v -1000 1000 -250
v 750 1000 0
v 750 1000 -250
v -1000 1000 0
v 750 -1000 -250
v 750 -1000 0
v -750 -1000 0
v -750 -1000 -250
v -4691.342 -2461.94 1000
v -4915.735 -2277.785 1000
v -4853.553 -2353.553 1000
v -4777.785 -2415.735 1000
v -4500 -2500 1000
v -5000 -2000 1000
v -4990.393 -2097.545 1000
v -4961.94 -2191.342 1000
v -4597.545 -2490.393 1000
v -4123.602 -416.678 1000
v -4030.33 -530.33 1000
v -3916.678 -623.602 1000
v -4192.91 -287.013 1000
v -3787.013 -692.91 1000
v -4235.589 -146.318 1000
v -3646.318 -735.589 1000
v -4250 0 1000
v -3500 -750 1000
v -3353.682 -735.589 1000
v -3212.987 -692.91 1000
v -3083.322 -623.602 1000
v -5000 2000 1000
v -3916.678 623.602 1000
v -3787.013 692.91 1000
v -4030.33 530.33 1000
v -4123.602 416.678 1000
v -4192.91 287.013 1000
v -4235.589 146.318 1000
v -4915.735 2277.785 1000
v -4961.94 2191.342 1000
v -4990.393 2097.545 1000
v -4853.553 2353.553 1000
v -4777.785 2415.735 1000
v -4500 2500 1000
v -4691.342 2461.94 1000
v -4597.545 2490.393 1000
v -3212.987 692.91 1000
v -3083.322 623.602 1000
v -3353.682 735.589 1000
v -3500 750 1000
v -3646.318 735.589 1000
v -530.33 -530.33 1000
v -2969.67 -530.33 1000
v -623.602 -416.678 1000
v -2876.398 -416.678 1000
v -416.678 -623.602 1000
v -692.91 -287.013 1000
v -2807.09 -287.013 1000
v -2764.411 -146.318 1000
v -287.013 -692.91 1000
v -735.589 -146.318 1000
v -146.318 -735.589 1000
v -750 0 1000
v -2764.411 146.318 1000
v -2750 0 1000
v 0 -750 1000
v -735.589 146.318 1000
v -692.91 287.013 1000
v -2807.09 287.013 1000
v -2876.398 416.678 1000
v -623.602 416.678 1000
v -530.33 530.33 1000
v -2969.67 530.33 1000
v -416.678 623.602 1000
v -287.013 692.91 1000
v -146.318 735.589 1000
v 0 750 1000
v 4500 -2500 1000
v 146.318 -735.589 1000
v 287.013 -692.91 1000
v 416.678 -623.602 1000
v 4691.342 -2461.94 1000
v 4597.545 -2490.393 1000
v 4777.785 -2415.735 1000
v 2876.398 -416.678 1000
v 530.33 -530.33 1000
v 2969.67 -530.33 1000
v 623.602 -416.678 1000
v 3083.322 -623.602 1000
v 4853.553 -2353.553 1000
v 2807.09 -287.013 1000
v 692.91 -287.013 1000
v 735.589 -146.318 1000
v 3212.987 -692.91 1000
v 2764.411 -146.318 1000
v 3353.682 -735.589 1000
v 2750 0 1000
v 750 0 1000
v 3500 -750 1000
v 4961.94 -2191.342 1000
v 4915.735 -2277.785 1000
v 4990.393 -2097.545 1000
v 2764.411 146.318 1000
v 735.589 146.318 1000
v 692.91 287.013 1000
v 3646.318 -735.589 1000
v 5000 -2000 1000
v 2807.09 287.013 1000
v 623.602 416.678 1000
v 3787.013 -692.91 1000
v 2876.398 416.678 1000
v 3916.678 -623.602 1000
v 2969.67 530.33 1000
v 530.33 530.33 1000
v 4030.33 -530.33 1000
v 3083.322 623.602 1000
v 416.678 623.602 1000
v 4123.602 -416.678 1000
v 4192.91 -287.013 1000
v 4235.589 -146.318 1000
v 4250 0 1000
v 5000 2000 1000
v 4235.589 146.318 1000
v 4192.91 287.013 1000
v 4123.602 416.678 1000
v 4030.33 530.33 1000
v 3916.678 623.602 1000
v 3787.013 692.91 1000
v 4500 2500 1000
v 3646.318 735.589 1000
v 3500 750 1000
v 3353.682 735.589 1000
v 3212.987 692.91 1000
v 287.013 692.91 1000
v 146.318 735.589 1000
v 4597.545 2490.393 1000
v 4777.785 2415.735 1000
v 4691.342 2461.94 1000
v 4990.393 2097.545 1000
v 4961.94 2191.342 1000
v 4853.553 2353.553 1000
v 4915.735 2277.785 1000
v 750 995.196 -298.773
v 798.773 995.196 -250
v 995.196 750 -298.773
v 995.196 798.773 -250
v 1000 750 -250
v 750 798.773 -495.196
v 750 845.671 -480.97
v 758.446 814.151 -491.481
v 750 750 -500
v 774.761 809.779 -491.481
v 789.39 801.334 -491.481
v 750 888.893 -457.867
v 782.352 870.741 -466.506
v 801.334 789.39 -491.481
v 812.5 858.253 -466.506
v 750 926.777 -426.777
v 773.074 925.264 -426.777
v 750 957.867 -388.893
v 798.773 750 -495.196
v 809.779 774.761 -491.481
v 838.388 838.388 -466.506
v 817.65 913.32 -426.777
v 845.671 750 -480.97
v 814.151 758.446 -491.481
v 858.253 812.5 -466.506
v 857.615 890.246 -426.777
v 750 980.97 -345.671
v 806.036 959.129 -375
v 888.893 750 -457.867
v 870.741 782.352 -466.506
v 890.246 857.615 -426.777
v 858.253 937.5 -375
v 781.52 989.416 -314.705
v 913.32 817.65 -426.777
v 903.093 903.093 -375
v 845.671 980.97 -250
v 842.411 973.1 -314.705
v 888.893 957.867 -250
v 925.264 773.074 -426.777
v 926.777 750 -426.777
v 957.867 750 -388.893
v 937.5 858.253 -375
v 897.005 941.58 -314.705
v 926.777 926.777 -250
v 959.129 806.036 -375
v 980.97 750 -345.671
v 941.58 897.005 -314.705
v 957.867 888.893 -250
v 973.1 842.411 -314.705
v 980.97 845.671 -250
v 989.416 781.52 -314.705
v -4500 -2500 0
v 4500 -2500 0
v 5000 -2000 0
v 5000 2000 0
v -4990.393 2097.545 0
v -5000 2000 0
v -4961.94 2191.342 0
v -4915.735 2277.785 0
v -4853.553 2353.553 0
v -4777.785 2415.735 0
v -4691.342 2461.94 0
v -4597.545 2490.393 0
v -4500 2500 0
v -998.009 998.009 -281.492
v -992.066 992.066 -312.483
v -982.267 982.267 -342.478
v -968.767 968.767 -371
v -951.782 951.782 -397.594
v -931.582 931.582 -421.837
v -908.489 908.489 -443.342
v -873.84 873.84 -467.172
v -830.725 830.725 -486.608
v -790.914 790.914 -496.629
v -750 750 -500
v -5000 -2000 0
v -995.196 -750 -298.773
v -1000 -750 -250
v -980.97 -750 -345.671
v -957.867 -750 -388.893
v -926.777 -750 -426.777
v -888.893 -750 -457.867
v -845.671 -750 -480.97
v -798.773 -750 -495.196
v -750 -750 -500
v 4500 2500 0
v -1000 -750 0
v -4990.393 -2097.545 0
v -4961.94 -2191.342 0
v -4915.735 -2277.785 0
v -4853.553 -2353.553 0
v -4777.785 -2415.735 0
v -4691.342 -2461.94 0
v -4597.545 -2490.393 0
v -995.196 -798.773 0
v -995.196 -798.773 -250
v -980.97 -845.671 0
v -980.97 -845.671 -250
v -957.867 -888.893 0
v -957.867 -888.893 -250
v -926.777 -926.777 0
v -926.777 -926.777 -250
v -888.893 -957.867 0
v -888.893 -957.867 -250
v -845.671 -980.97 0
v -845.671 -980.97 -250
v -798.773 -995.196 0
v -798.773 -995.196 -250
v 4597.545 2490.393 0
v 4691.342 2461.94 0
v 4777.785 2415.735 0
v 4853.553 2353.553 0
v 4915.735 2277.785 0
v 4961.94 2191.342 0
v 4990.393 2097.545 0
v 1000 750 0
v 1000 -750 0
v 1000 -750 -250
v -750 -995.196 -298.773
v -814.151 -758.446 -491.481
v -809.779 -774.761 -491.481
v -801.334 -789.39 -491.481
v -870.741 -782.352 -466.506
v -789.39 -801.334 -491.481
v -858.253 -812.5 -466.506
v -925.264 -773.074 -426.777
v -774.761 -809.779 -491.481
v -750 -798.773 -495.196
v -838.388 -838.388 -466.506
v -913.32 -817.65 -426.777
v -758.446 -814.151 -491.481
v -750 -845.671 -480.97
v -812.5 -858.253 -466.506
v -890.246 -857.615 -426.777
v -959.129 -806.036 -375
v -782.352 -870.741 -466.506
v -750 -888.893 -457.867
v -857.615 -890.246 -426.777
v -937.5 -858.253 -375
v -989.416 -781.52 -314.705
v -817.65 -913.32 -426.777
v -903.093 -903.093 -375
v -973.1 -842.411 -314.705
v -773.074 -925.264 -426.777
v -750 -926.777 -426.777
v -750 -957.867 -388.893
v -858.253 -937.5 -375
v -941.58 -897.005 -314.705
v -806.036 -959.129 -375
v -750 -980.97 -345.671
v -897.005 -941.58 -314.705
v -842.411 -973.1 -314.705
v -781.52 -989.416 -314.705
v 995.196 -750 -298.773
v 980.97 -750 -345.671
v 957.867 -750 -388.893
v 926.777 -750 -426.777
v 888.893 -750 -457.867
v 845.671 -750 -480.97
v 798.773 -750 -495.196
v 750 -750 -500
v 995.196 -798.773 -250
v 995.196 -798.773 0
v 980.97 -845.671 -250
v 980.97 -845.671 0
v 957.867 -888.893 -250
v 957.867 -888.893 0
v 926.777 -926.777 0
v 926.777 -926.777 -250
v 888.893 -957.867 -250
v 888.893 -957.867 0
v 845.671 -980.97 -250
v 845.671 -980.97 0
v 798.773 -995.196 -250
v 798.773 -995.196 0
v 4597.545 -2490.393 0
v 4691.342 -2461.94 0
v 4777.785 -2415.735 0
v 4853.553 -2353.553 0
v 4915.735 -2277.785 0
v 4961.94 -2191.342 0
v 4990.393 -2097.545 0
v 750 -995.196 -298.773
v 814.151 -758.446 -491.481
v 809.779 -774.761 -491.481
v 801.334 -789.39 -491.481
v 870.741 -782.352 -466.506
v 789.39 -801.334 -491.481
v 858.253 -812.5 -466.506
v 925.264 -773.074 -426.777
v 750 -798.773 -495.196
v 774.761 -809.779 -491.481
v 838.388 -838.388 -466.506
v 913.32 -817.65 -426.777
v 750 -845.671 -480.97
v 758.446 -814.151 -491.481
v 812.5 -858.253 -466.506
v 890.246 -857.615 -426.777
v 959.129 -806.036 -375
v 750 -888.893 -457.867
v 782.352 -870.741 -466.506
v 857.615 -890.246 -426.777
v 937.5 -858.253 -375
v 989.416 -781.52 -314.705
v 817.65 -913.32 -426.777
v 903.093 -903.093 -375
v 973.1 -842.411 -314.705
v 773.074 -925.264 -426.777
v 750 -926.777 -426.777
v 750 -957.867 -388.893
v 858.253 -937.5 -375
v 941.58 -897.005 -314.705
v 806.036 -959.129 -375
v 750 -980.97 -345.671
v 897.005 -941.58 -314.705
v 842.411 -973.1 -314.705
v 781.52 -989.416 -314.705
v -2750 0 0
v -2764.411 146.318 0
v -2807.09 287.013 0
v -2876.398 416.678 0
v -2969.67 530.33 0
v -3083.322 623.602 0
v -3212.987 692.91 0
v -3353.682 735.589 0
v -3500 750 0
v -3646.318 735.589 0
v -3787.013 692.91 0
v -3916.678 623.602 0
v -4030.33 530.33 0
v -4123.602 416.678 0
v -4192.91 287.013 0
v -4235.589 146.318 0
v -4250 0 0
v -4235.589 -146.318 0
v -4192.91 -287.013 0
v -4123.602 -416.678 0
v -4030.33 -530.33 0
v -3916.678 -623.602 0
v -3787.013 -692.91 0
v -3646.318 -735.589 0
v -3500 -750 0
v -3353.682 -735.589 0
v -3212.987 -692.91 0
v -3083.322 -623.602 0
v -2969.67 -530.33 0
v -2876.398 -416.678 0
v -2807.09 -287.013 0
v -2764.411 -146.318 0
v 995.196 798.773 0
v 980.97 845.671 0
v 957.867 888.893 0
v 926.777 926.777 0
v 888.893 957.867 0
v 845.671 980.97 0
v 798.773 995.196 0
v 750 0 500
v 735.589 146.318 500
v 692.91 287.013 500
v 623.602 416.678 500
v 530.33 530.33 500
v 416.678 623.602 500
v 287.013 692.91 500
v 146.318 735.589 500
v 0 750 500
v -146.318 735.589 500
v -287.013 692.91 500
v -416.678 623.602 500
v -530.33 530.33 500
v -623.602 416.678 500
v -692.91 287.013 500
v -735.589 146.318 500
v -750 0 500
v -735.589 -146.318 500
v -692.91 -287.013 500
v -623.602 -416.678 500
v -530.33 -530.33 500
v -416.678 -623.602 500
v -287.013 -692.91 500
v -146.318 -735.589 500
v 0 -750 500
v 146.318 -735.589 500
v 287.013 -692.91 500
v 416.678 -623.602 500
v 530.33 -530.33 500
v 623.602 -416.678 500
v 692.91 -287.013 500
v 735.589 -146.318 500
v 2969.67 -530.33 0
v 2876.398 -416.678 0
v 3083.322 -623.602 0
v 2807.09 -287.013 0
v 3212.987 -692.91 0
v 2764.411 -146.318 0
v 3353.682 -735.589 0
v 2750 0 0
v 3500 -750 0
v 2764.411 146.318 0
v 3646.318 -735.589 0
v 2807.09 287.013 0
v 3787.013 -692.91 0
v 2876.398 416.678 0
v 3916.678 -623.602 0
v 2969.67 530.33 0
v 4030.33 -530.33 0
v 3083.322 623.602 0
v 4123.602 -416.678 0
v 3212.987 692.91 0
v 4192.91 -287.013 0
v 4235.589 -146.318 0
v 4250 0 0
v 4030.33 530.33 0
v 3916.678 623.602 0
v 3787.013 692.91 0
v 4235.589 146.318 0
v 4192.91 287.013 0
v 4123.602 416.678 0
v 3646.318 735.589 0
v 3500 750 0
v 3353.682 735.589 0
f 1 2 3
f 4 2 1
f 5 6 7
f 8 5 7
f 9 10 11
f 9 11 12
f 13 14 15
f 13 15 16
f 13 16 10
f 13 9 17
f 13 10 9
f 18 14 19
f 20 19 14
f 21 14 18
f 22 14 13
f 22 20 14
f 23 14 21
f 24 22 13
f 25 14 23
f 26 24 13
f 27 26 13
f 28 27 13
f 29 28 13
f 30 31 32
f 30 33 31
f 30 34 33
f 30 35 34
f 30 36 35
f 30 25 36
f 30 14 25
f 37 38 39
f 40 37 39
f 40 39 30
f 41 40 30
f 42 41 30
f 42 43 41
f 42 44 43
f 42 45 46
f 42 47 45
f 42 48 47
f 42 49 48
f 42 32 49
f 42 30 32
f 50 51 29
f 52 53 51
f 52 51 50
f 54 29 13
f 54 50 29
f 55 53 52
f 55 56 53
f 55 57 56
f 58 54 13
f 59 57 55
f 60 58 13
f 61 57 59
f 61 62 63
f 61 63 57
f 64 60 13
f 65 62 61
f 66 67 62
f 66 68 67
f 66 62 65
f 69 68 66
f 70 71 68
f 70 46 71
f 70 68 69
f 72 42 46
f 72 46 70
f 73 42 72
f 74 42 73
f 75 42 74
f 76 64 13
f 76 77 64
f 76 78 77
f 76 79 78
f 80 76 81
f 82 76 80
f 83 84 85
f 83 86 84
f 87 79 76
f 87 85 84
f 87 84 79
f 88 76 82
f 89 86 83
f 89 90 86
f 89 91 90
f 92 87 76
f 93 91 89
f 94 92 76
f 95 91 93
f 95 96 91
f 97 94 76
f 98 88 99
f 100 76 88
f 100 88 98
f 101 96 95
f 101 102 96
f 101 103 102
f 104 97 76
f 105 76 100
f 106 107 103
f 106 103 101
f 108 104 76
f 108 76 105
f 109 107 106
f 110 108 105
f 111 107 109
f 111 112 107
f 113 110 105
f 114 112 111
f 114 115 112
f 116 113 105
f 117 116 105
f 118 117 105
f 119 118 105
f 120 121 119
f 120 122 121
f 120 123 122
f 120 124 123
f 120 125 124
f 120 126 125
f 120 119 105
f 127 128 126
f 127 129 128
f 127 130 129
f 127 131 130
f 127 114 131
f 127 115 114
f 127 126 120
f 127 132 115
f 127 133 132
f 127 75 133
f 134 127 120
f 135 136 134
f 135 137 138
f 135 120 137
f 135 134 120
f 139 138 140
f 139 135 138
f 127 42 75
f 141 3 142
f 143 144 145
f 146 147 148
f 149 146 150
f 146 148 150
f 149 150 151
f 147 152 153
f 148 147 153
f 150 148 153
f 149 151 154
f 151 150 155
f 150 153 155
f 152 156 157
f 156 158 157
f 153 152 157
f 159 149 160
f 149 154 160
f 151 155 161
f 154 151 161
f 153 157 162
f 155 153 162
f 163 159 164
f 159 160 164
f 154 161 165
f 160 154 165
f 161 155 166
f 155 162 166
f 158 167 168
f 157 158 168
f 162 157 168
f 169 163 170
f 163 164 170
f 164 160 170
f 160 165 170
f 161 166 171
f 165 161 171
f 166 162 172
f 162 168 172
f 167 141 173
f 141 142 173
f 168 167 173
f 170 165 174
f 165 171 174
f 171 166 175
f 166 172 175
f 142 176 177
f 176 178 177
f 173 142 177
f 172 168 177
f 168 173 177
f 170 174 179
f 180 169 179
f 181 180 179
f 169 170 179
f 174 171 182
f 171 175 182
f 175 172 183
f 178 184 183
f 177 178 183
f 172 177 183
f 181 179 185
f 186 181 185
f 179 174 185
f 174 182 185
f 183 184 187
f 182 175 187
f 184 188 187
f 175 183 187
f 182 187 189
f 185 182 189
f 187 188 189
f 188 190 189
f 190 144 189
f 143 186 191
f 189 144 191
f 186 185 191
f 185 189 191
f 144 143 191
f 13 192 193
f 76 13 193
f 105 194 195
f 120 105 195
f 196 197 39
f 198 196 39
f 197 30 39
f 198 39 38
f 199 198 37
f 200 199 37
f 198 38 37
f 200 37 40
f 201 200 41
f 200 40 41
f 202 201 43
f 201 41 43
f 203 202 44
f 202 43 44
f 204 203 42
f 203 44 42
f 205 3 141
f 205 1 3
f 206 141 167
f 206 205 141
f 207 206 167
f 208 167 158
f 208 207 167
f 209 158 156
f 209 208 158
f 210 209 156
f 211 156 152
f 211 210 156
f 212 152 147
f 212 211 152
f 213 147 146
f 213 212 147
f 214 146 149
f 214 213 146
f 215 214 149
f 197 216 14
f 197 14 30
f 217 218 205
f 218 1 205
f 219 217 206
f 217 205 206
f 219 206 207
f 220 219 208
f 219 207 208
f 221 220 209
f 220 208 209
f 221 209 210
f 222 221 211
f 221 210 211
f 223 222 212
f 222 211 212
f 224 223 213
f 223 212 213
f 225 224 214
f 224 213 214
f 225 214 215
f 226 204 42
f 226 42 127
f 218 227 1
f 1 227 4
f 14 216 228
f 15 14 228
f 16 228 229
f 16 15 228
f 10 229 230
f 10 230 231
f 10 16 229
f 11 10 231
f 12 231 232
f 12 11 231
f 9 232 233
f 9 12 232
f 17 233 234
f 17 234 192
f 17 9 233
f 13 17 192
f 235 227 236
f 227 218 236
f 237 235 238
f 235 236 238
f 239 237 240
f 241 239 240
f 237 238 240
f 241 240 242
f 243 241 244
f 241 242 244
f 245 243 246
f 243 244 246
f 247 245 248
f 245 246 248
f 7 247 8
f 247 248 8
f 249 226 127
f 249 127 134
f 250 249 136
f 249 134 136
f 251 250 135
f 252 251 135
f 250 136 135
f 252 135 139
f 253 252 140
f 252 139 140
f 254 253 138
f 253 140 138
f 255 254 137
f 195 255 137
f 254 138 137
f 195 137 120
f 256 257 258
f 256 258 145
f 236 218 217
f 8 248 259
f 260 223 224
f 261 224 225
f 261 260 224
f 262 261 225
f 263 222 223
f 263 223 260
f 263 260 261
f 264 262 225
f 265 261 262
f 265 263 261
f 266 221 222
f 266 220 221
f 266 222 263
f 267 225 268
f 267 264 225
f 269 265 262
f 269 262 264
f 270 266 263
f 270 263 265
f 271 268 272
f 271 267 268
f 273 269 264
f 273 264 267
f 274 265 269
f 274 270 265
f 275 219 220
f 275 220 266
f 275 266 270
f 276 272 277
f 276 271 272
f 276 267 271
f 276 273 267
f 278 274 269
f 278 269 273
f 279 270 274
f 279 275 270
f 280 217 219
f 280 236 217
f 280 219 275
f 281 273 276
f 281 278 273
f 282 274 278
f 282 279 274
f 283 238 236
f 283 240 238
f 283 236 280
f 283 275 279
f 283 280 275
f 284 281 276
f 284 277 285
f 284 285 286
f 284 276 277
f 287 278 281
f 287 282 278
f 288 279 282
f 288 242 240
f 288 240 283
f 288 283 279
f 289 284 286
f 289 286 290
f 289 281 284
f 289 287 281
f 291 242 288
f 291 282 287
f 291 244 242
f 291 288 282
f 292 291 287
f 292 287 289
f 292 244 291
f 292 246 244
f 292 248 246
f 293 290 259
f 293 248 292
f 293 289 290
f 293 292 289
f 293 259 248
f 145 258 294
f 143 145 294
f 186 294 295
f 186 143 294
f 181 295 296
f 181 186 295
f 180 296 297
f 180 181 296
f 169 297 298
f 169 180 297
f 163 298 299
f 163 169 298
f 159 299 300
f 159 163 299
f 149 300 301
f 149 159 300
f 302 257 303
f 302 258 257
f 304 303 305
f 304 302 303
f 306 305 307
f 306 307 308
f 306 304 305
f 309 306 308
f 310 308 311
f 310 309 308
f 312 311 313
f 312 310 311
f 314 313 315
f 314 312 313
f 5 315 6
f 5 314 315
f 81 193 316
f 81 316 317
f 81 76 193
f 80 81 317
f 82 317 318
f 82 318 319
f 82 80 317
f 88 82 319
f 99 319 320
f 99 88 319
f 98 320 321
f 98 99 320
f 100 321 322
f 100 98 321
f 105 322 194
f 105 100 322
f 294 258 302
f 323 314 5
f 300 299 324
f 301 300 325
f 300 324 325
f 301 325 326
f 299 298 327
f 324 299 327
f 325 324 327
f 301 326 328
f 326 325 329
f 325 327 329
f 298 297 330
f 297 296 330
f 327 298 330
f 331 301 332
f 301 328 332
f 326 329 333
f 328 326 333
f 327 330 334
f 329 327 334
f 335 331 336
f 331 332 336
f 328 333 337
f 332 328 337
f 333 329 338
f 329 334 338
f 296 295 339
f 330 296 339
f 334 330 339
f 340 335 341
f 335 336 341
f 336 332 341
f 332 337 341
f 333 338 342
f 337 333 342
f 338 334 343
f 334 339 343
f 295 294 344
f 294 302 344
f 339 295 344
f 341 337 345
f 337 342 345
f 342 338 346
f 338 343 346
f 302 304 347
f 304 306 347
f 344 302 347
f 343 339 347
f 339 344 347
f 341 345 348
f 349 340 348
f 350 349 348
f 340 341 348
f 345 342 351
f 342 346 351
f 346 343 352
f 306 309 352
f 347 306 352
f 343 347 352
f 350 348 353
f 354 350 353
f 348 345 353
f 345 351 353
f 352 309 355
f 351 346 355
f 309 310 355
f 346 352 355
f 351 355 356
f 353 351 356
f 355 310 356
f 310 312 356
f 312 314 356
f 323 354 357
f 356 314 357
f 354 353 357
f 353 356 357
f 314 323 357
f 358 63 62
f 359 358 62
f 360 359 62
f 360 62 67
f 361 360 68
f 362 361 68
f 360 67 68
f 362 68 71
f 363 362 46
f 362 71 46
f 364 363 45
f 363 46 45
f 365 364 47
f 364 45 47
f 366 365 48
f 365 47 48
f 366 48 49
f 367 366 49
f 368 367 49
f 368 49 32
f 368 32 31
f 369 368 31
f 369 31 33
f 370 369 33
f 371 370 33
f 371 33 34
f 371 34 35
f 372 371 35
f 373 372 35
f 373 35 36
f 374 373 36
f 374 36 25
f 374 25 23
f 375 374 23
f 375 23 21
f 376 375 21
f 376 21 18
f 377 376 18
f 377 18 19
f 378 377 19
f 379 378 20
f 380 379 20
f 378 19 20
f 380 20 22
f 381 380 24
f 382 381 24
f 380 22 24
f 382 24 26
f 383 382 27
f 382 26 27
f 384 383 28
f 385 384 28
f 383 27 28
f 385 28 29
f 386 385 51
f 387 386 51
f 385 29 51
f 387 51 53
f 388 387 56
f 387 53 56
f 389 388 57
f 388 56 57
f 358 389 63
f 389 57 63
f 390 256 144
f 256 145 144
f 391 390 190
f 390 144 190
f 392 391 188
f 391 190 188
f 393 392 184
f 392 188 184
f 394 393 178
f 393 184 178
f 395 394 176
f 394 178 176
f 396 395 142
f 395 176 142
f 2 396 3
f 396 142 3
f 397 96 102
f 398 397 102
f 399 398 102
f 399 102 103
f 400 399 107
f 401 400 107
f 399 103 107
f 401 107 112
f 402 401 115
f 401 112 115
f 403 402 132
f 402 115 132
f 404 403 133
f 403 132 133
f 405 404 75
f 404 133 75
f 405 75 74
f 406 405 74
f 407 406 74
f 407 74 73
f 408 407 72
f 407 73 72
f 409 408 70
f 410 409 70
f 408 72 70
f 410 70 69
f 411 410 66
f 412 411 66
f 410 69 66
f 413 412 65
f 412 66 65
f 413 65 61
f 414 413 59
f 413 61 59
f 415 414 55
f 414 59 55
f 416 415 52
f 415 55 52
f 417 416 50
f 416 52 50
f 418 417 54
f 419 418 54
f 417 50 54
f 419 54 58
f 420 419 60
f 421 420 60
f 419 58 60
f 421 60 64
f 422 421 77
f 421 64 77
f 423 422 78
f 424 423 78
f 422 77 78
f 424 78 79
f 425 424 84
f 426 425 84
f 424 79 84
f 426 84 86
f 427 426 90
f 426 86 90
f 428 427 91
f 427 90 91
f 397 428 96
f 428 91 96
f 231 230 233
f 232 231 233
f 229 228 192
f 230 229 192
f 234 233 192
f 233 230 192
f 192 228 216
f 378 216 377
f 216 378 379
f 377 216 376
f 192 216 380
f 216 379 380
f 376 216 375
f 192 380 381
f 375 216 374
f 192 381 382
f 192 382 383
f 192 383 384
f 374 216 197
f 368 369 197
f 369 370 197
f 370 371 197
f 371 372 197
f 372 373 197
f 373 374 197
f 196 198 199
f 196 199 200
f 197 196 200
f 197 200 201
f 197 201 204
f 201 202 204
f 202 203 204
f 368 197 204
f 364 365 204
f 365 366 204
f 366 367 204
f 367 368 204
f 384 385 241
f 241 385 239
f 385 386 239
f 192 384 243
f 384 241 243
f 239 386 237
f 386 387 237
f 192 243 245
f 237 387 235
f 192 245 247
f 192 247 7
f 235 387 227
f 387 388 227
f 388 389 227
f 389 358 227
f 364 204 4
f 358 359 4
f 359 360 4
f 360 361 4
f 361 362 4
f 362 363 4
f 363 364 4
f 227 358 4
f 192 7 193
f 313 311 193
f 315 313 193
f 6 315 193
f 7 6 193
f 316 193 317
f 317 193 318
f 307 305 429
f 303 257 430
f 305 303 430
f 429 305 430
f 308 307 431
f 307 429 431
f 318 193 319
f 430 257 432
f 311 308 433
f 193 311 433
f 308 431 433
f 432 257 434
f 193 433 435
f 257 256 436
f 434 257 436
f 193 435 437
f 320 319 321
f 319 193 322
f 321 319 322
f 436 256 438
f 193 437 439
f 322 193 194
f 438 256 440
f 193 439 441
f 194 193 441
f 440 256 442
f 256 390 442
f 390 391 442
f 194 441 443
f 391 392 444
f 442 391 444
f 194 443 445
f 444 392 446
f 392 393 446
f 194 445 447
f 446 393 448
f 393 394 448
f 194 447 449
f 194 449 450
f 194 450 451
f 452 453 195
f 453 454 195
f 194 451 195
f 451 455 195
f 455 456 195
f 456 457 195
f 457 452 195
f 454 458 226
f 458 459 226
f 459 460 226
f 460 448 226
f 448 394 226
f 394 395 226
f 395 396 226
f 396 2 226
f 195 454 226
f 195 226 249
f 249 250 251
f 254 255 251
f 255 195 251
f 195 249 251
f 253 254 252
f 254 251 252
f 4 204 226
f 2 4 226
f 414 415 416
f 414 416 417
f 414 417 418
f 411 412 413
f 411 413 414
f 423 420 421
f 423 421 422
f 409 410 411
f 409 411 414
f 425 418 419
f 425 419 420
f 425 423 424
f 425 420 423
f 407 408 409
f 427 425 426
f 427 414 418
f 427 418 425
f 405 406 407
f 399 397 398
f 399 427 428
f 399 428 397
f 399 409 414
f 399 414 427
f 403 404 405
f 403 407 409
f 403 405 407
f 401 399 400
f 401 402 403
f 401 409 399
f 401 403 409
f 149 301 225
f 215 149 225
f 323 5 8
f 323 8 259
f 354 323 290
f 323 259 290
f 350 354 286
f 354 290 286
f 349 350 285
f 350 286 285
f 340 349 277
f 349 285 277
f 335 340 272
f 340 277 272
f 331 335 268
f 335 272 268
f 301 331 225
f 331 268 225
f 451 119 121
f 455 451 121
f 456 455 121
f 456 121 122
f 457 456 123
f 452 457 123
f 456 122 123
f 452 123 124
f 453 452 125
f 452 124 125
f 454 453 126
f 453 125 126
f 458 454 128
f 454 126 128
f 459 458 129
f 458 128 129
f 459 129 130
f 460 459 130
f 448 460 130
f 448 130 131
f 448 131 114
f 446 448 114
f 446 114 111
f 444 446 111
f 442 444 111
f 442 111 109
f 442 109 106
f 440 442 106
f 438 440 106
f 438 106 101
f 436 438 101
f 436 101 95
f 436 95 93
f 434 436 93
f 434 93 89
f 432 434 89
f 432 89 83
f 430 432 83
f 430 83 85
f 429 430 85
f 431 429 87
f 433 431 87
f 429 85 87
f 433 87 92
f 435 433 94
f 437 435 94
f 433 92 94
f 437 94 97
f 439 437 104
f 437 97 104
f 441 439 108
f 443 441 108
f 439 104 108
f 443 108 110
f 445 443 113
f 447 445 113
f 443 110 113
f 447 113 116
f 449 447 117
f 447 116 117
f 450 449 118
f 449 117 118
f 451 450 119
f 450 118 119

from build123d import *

# Parameters (mm, degrees)
SKETCH1_W           = 10000
SKETCH1_H           = 5000
BOSS_EXTRUDE1_DEPTH = 1000
FILLET1_R           = 500
FILLET2_R           = 500
SKETCH2_R           = 750
CUT_EXTRUDE1_DEPTH  = 5679.9083458
SKETCH3_R           = 750
CUT_EXTRUDE2_DEPTH  = 500
SKETCH4_W           = 2000
SKETCH4_H           = 2000
BOSS_EXTRUDE2_DEPTH = 500
FILLET3_R           = 250


with BuildPart() as part:
    # Sketch1 → Boss-Extrude1 (new body)
    with BuildSketch(Plane.XY):
        Rectangle(SKETCH1_W, SKETCH1_H)
    extrude(amount=BOSS_EXTRUDE1_DEPTH)

    # Fillet1
    fillet1_edges = [part.edges().sort_by_distance(p)[0] for p in [
        (-5000, 2500, 500),
    ]]
    fillet(fillet1_edges, radius=FILLET1_R)

    # Fillet2
    fillet2_edges = [part.edges().sort_by_distance(p)[0] for p in [
        (5000, -2500, 500),
        (-5000, -2500, 500),
        (5000, 2500, 500),
    ]]
    fillet(fillet2_edges, radius=FILLET2_R)

    # Sketch2 → Cut-Extrude1 (cut, through all)
    with BuildSketch(Plane.XY.offset(1000)):
        with Locations((-3500, 0)):
            Circle(SKETCH2_R)
        with Locations((3500, 0)):
            Circle(SKETCH2_R)
    extrude(amount=-CUT_EXTRUDE1_DEPTH, mode=Mode.SUBTRACT)

    # Sketch3 → Cut-Extrude2 (cut)
    with BuildSketch(Plane.XY.offset(1000)):
        Circle(SKETCH3_R)
    extrude(amount=-CUT_EXTRUDE2_DEPTH, mode=Mode.SUBTRACT)

    # Sketch4 → Boss-Extrude2 (add)
    with BuildSketch(Plane(origin=(0, 0, 0), x_dir=(-1, 0, 0), z_dir=(0, 0, -1))):
        Rectangle(SKETCH4_W, SKETCH4_H)
    extrude(amount=BOSS_EXTRUDE2_DEPTH)

    # Fillet3
    fillet3_edges = [part.edges().sort_by_distance(p)[0] for p in [
        (-1000, -1000, -250),
        (1000, 1000, -250),
        (1000, -1000, -250),
        (-1000, 0, -500),
        (0, 1000, -500),
        (1000, 0, -500),
        (0, -1000, -500),
    ]]
    fillet(fillet3_edges, radius=FILLET3_R)


solid = part.part
